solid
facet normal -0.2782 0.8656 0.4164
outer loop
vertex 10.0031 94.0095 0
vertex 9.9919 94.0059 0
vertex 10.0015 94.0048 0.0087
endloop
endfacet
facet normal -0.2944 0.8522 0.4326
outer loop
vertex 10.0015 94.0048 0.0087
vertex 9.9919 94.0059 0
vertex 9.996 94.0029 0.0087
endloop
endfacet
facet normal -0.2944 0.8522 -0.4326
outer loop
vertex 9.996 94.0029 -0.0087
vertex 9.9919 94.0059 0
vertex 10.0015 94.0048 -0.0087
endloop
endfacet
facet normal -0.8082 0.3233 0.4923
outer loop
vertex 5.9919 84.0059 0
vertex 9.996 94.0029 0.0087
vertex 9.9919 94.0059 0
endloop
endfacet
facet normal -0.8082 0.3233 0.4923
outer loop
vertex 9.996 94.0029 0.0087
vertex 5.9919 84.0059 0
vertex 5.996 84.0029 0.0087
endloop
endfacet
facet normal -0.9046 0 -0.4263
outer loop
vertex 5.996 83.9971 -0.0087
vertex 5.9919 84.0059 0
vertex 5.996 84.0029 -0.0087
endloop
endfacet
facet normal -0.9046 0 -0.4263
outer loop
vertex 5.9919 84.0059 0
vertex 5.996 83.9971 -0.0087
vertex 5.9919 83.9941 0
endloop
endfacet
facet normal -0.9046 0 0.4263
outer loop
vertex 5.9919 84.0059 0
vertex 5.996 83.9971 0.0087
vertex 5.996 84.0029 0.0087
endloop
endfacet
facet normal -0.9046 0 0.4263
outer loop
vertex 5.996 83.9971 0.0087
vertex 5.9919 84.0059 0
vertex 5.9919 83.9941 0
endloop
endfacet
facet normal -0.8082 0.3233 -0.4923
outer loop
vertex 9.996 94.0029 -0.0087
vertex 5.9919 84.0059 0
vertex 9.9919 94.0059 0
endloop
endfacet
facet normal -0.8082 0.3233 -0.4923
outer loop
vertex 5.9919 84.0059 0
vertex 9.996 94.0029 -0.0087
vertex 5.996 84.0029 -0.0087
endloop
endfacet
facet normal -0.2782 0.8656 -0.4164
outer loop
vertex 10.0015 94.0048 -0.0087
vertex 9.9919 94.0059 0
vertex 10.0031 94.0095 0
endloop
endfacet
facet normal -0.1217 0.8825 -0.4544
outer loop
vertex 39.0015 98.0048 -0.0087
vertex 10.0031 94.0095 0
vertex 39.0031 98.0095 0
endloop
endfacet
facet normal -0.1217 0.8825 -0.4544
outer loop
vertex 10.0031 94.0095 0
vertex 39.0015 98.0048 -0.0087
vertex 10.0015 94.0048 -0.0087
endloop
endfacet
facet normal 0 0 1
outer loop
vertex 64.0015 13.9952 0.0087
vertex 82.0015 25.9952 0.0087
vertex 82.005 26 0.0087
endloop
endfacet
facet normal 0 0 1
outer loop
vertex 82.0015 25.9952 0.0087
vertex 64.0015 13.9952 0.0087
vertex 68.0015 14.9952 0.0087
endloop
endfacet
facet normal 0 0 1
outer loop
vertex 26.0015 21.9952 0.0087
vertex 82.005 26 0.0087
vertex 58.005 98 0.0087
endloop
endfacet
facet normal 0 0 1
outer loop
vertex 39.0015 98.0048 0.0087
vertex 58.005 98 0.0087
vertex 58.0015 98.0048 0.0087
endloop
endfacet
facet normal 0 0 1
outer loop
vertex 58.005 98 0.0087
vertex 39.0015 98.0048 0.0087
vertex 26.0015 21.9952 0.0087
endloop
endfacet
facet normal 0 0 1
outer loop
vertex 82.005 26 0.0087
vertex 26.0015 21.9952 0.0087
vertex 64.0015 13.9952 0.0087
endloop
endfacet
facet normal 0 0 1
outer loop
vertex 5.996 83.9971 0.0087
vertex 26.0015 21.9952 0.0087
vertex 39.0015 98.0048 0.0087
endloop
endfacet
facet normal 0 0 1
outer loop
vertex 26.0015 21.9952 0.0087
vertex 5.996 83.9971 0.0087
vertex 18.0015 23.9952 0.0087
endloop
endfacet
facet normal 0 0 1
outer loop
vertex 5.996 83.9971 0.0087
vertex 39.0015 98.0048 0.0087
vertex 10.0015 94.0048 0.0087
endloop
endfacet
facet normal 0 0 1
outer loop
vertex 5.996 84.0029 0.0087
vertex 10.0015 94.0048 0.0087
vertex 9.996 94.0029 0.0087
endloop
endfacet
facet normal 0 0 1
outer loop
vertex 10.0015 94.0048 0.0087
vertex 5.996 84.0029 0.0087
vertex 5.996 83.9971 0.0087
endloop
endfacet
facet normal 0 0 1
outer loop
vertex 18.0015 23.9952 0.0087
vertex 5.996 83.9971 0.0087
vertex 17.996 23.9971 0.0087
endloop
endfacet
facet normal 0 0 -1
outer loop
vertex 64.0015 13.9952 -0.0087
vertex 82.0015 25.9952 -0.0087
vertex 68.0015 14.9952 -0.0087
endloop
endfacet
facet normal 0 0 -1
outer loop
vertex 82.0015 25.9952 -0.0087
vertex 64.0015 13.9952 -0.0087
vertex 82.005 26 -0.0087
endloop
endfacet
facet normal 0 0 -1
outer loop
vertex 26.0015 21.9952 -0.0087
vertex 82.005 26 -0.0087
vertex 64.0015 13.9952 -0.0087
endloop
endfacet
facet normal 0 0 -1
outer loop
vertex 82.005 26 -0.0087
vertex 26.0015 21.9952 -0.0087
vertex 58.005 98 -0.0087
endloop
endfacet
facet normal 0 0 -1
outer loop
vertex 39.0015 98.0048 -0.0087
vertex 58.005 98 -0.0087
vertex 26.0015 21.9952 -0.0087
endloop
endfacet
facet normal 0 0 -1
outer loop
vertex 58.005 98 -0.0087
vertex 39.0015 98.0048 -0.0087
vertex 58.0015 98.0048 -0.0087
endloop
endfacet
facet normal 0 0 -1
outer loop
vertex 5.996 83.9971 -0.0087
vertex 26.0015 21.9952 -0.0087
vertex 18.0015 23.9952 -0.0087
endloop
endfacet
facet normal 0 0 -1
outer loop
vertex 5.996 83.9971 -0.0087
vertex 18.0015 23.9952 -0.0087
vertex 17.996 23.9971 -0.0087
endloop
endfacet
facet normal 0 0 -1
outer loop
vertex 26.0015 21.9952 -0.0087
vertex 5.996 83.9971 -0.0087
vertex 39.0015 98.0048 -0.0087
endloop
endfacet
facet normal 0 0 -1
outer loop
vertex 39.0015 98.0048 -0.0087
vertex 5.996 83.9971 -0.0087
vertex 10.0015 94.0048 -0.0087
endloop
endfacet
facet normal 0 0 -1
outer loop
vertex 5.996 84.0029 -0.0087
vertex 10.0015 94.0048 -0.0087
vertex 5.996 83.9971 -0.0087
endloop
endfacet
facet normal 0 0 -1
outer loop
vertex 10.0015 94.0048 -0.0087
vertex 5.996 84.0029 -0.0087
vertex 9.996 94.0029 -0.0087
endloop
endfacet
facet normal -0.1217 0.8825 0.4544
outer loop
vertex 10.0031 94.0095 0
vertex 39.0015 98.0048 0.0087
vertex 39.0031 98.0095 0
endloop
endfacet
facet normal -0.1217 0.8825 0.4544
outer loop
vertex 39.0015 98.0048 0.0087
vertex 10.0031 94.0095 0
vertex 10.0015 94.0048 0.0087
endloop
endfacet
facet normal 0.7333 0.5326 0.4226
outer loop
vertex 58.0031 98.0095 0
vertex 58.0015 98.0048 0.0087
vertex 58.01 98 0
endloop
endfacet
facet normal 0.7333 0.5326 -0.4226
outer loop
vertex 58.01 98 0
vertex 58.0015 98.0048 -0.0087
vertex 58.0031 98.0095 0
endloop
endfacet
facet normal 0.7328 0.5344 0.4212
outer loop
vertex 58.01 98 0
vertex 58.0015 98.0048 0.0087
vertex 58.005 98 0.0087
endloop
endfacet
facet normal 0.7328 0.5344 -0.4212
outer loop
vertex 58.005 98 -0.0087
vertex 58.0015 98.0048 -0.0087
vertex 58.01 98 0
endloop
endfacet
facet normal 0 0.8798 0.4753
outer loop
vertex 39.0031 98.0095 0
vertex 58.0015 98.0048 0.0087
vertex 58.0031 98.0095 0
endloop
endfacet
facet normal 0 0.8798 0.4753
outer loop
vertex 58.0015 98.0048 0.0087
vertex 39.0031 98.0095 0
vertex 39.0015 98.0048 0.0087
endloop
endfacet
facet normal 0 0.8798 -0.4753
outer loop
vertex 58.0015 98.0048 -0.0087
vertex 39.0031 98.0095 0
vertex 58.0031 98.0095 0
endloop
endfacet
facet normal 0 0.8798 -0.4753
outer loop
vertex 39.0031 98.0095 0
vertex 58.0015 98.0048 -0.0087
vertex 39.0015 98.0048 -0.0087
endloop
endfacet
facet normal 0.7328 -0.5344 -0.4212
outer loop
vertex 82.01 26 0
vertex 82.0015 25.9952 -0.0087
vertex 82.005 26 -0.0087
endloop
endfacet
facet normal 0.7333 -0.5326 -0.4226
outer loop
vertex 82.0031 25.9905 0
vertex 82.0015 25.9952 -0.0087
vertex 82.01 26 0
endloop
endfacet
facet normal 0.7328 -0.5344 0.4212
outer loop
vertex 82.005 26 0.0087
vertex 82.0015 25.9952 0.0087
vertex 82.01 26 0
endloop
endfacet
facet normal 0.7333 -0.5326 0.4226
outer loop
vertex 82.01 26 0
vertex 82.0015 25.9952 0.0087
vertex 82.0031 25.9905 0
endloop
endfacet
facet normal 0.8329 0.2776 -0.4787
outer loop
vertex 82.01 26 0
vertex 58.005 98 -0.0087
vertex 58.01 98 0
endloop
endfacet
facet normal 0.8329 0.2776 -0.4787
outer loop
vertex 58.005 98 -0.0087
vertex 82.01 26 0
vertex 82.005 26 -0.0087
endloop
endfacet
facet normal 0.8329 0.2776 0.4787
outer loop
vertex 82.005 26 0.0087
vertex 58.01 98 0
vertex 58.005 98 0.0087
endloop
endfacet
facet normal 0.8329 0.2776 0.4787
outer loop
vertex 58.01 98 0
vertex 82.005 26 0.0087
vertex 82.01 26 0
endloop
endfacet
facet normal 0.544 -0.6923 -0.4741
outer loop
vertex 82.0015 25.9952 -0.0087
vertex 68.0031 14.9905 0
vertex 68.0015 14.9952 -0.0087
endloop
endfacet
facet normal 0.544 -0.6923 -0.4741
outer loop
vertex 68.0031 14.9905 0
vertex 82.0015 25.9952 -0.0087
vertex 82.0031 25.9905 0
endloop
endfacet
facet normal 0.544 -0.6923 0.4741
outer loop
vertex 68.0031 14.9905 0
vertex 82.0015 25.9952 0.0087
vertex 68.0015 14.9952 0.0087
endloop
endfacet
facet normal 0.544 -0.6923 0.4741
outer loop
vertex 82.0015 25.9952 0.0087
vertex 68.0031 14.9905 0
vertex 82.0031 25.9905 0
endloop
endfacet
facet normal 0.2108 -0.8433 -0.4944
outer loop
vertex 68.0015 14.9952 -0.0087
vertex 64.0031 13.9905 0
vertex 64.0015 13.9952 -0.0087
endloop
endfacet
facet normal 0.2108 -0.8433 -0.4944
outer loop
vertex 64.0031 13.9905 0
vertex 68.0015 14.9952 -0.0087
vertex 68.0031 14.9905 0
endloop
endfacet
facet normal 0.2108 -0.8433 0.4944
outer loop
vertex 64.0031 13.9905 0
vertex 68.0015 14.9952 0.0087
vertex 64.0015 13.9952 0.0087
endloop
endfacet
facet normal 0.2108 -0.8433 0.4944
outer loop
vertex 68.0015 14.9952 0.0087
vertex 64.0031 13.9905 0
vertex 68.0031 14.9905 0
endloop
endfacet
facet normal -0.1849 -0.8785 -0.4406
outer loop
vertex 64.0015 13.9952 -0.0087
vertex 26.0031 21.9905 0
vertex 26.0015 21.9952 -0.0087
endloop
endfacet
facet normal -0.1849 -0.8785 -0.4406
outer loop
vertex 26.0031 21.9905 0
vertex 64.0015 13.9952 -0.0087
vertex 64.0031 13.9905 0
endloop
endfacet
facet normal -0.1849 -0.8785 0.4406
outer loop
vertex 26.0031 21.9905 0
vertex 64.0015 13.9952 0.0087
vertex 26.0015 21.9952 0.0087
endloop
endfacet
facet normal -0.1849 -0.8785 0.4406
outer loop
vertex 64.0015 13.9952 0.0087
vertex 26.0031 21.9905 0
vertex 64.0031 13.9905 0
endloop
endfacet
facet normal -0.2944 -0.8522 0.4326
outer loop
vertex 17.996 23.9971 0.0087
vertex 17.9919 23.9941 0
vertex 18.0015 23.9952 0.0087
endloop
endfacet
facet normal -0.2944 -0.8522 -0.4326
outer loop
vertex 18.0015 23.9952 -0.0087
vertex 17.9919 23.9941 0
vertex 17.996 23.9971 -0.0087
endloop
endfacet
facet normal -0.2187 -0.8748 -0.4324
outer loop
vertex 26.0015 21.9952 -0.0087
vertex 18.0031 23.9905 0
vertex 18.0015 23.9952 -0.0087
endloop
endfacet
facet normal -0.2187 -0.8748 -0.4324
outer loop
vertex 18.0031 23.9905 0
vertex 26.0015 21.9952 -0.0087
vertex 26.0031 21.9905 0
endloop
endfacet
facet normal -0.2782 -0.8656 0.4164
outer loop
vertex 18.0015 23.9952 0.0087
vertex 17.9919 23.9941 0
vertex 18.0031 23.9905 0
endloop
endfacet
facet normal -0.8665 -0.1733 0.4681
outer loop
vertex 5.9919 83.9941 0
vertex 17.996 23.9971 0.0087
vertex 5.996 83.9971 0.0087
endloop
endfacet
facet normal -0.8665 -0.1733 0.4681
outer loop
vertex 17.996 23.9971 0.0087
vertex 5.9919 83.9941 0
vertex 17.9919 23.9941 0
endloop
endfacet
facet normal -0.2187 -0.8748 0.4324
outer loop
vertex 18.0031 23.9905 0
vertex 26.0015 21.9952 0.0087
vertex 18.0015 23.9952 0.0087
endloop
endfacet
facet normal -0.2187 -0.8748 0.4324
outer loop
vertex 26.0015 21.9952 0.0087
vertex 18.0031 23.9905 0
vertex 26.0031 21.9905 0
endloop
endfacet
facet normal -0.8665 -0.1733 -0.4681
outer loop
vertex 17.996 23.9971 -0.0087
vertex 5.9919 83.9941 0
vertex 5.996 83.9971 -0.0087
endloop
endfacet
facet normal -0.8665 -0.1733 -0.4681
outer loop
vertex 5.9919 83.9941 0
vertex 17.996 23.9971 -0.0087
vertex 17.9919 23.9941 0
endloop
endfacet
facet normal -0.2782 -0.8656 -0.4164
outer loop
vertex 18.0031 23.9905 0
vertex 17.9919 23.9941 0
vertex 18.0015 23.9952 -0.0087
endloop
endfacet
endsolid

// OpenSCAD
color([0.3519350680925015,0.6477014615427978,0.14125726454845833]) hull(){
    translate([6,84]) sphere(0.01);
    translate([10,94]) sphere(0.01);
    translate([39,98]) sphere(0.01);
}
color([0.23013900541024712,0.8285218163248013,0.9603761550286747]) hull(){
    translate([6,84]) sphere(0.01);
    translate([39,98]) sphere(0.01);
    translate([22,90]) sphere(0.01);
}
color([0.6050710034948523,0.017553655236826726,0.43262871278032167]) hull(){
    translate([6,84]) sphere(0.01);
    translate([22,90]) sphere(0.01);
    translate([58,98]) sphere(0.01);
}
color([0.2571490251669072,0.4480229944680496,0.14517873337393172]) hull(){
    translate([39,98]) sphere(0.01);
    translate([58,98]) sphere(0.01);
    translate([22,90]) sphere(0.01);
}
color([0.8405131005933094,0.9776834869331054,0.10300019528175153]) hull(){
    translate([6,84]) sphere(0.01);
    translate([58,98]) sphere(0.01);
    translate([50,93]) sphere(0.01);
}
color([0.998153073210626,0.8535026464000083,0.6855970549077809]) hull(){
    translate([6,84]) sphere(0.01);
    translate([50,93]) sphere(0.01);
    translate([44,55]) sphere(0.01);
}
color([0.7995005100691247,0.34047238184459006,0.1286635278612125]) hull(){
    translate([50,93]) sphere(0.01);
    translate([82,26]) sphere(0.01);
    translate([44,55]) sphere(0.01);
}
color([0.6020598448119898,0.9167847797194366,0.02081986636819022]) hull(){
    translate([58,98]) sphere(0.01);
    translate([82,26]) sphere(0.01);
    translate([50,93]) sphere(0.01);
}
color([0.9135118305629362,0.3823609034395232,0.42581309278619206]) hull(){
    translate([6,84]) sphere(0.01);
    translate([44,55]) sphere(0.01);
    translate([44,47]) sphere(0.01);
}
color([0.08967296065919184,0.0016857337534631478,0.31287848776698257]) hull(){
    translate([44,55]) sphere(0.01);
    translate([68,15]) sphere(0.01);
    translate([44,47]) sphere(0.01);
}
color([0.09731792302828757,0.364404074066101,0.8754307508322564]) hull(){
    translate([68,15]) sphere(0.01);
    translate([6,84]) sphere(0.01);
    translate([44,47]) sphere(0.01);
}
color([0.6967090939923642,0.5776053806129825,0.18685318159950626]) hull(){
    translate([44,55]) sphere(0.01);
    translate([68,15]) sphere(0.01);
    translate([58,33]) sphere(0.01);
}
color([0.9585806736472646,0.593334846568766,0.09927504601217696]) hull(){
    translate([68,15]) sphere(0.01);
    translate([82,26]) sphere(0.01);
    translate([58,33]) sphere(0.01);
}
color([0.19313665173925,0.6863688301261038,0.2093263356404984]) hull(){
    translate([82,26]) sphere(0.01);
    translate([44,55]) sphere(0.01);
    translate([58,33]) sphere(0.01);
}
color([0.2694340379225941,0.24598969558588324,0.16092298384524362]) hull(){
    translate([6,84]) sphere(0.01);
    translate([68,15]) sphere(0.01);
    translate([64,14]) sphere(0.01);
}
color([0.5102606956149307,0.431705445139412,0.38909399282504675]) hull(){
    translate([6,84]) sphere(0.01);
    translate([64,14]) sphere(0.01);
    translate([18,58]) sphere(0.01);
}
color([0.3194819673674283,0.6655357355223767,0.22692357675811492]) hull(){
    translate([64,14]) sphere(0.01);
    translate([26,22]) sphere(0.01);
    translate([42,29]) sphere(0.01);
}
color([0.9464906820257937,0.35776616524050997,0.9421064453260054]) hull(){
    translate([26,22]) sphere(0.01);
    translate([18,58]) sphere(0.01);
    translate([42,29]) sphere(0.01);
}
color([0.3792404853118415,0.27508202782836655,0.9368074710650367]) hull(){
    translate([18,58]) sphere(0.01);
    translate([64,14]) sphere(0.01);
    translate([42,29]) sphere(0.01);
}
color([0.7670397757471089,0.17483880300164423,0.7474114244696689]) hull(){
    translate([26,22]) sphere(0.01);
    translate([6,84]) sphere(0.01);
    translate([18,58]) sphere(0.01);
}
color([0.6015236368594579,0.5872808850844162,0.28390336255679416]) hull(){
    translate([6,84]) sphere(0.01);
    translate([26,22]) sphere(0.01);
    translate([18,24]) sphere(0.01);
}
